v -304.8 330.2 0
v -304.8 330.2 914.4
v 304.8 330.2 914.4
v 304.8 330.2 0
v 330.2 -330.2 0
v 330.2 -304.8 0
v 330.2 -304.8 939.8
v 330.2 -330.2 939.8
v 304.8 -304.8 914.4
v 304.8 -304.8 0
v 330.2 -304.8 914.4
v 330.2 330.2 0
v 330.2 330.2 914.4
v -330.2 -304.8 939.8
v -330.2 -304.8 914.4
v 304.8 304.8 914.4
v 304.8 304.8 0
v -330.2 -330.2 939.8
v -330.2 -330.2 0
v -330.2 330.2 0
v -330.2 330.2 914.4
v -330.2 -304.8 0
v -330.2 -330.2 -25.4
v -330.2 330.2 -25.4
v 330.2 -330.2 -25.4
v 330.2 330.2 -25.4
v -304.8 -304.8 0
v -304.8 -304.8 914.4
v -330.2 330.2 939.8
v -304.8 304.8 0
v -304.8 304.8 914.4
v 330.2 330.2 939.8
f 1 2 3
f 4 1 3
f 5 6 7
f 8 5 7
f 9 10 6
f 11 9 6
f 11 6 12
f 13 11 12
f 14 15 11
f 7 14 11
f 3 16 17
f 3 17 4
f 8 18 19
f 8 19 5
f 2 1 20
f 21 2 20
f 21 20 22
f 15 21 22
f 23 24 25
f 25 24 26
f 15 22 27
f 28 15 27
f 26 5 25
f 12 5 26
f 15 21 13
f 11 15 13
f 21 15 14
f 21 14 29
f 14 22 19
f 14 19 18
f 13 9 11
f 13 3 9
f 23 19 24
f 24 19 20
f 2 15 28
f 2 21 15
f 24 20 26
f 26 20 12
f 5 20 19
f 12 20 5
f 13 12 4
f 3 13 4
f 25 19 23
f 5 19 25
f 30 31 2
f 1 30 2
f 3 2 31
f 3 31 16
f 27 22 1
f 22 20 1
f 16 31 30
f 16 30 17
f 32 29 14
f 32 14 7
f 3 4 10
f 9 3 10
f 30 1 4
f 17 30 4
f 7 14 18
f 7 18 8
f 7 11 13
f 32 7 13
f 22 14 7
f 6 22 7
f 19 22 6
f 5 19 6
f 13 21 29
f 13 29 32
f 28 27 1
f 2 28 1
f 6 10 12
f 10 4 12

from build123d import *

# Parameters (mm, degrees)
F1_DEPTH = 914.4
F0_W     = 609.6
F0_H     = 25.4
F2_DEPTH = 914.4
F3_W     = 660.4
F3_H     = 635
F4_DEPTH = 25.4
F5_W     = 660.4
F5_H     = 660.4
F6_DEPTH = 25.4
F7_W     = 660.4
F7_H     = 939.8
F8_DEPTH = 25.4


with BuildPart() as f1:
    # F0 (on Top) → F1 (new body)
    with BuildSketch(Plane.XY):
        Polygon((-330.2, -304.8), (-304.8, -304.8), (-304.8, 304.8), (-304.8, 330.2), (-330.2, 330.2), align=None)
        Polygon((304.8, 304.8), (304.8, -304.8), (330.2, -304.8), (330.2, 330.2), (304.8, 330.2), align=None)
    extrude(amount=F1_DEPTH)


with BuildPart() as f2:
    # F0 (on Top) → F2 (new body, through all)
    with BuildSketch(Plane.XY):
        with Locations((0, 317.5)):
            Rectangle(F0_W, F0_H)
    extrude(amount=F2_DEPTH)


with BuildPart() as f4:
    # F3 (on face) → F4 (new body)
    with BuildSketch(Plane.XY.offset(914.4)):
        with Locations((0, 12.7)):
            Rectangle(F3_W, F3_H)
    extrude(amount=F4_DEPTH)


with BuildPart() as f6:
    # F5 (on Top) → F6 (new body)
    with BuildSketch(Plane.XY):
        Rectangle(F5_W, F5_H)
    extrude(amount=-F6_DEPTH)


with BuildPart() as f8:
    # F7 (on face) → F8 (new body)
    with BuildSketch(Plane.XZ.offset(304.8)):
        with Locations((0, 469.9)):
            Rectangle(F7_W, F7_H)
    extrude(amount=F8_DEPTH)


solid = Compound([f1.part, f2.part, f4.part, f6.part, f8.part])
